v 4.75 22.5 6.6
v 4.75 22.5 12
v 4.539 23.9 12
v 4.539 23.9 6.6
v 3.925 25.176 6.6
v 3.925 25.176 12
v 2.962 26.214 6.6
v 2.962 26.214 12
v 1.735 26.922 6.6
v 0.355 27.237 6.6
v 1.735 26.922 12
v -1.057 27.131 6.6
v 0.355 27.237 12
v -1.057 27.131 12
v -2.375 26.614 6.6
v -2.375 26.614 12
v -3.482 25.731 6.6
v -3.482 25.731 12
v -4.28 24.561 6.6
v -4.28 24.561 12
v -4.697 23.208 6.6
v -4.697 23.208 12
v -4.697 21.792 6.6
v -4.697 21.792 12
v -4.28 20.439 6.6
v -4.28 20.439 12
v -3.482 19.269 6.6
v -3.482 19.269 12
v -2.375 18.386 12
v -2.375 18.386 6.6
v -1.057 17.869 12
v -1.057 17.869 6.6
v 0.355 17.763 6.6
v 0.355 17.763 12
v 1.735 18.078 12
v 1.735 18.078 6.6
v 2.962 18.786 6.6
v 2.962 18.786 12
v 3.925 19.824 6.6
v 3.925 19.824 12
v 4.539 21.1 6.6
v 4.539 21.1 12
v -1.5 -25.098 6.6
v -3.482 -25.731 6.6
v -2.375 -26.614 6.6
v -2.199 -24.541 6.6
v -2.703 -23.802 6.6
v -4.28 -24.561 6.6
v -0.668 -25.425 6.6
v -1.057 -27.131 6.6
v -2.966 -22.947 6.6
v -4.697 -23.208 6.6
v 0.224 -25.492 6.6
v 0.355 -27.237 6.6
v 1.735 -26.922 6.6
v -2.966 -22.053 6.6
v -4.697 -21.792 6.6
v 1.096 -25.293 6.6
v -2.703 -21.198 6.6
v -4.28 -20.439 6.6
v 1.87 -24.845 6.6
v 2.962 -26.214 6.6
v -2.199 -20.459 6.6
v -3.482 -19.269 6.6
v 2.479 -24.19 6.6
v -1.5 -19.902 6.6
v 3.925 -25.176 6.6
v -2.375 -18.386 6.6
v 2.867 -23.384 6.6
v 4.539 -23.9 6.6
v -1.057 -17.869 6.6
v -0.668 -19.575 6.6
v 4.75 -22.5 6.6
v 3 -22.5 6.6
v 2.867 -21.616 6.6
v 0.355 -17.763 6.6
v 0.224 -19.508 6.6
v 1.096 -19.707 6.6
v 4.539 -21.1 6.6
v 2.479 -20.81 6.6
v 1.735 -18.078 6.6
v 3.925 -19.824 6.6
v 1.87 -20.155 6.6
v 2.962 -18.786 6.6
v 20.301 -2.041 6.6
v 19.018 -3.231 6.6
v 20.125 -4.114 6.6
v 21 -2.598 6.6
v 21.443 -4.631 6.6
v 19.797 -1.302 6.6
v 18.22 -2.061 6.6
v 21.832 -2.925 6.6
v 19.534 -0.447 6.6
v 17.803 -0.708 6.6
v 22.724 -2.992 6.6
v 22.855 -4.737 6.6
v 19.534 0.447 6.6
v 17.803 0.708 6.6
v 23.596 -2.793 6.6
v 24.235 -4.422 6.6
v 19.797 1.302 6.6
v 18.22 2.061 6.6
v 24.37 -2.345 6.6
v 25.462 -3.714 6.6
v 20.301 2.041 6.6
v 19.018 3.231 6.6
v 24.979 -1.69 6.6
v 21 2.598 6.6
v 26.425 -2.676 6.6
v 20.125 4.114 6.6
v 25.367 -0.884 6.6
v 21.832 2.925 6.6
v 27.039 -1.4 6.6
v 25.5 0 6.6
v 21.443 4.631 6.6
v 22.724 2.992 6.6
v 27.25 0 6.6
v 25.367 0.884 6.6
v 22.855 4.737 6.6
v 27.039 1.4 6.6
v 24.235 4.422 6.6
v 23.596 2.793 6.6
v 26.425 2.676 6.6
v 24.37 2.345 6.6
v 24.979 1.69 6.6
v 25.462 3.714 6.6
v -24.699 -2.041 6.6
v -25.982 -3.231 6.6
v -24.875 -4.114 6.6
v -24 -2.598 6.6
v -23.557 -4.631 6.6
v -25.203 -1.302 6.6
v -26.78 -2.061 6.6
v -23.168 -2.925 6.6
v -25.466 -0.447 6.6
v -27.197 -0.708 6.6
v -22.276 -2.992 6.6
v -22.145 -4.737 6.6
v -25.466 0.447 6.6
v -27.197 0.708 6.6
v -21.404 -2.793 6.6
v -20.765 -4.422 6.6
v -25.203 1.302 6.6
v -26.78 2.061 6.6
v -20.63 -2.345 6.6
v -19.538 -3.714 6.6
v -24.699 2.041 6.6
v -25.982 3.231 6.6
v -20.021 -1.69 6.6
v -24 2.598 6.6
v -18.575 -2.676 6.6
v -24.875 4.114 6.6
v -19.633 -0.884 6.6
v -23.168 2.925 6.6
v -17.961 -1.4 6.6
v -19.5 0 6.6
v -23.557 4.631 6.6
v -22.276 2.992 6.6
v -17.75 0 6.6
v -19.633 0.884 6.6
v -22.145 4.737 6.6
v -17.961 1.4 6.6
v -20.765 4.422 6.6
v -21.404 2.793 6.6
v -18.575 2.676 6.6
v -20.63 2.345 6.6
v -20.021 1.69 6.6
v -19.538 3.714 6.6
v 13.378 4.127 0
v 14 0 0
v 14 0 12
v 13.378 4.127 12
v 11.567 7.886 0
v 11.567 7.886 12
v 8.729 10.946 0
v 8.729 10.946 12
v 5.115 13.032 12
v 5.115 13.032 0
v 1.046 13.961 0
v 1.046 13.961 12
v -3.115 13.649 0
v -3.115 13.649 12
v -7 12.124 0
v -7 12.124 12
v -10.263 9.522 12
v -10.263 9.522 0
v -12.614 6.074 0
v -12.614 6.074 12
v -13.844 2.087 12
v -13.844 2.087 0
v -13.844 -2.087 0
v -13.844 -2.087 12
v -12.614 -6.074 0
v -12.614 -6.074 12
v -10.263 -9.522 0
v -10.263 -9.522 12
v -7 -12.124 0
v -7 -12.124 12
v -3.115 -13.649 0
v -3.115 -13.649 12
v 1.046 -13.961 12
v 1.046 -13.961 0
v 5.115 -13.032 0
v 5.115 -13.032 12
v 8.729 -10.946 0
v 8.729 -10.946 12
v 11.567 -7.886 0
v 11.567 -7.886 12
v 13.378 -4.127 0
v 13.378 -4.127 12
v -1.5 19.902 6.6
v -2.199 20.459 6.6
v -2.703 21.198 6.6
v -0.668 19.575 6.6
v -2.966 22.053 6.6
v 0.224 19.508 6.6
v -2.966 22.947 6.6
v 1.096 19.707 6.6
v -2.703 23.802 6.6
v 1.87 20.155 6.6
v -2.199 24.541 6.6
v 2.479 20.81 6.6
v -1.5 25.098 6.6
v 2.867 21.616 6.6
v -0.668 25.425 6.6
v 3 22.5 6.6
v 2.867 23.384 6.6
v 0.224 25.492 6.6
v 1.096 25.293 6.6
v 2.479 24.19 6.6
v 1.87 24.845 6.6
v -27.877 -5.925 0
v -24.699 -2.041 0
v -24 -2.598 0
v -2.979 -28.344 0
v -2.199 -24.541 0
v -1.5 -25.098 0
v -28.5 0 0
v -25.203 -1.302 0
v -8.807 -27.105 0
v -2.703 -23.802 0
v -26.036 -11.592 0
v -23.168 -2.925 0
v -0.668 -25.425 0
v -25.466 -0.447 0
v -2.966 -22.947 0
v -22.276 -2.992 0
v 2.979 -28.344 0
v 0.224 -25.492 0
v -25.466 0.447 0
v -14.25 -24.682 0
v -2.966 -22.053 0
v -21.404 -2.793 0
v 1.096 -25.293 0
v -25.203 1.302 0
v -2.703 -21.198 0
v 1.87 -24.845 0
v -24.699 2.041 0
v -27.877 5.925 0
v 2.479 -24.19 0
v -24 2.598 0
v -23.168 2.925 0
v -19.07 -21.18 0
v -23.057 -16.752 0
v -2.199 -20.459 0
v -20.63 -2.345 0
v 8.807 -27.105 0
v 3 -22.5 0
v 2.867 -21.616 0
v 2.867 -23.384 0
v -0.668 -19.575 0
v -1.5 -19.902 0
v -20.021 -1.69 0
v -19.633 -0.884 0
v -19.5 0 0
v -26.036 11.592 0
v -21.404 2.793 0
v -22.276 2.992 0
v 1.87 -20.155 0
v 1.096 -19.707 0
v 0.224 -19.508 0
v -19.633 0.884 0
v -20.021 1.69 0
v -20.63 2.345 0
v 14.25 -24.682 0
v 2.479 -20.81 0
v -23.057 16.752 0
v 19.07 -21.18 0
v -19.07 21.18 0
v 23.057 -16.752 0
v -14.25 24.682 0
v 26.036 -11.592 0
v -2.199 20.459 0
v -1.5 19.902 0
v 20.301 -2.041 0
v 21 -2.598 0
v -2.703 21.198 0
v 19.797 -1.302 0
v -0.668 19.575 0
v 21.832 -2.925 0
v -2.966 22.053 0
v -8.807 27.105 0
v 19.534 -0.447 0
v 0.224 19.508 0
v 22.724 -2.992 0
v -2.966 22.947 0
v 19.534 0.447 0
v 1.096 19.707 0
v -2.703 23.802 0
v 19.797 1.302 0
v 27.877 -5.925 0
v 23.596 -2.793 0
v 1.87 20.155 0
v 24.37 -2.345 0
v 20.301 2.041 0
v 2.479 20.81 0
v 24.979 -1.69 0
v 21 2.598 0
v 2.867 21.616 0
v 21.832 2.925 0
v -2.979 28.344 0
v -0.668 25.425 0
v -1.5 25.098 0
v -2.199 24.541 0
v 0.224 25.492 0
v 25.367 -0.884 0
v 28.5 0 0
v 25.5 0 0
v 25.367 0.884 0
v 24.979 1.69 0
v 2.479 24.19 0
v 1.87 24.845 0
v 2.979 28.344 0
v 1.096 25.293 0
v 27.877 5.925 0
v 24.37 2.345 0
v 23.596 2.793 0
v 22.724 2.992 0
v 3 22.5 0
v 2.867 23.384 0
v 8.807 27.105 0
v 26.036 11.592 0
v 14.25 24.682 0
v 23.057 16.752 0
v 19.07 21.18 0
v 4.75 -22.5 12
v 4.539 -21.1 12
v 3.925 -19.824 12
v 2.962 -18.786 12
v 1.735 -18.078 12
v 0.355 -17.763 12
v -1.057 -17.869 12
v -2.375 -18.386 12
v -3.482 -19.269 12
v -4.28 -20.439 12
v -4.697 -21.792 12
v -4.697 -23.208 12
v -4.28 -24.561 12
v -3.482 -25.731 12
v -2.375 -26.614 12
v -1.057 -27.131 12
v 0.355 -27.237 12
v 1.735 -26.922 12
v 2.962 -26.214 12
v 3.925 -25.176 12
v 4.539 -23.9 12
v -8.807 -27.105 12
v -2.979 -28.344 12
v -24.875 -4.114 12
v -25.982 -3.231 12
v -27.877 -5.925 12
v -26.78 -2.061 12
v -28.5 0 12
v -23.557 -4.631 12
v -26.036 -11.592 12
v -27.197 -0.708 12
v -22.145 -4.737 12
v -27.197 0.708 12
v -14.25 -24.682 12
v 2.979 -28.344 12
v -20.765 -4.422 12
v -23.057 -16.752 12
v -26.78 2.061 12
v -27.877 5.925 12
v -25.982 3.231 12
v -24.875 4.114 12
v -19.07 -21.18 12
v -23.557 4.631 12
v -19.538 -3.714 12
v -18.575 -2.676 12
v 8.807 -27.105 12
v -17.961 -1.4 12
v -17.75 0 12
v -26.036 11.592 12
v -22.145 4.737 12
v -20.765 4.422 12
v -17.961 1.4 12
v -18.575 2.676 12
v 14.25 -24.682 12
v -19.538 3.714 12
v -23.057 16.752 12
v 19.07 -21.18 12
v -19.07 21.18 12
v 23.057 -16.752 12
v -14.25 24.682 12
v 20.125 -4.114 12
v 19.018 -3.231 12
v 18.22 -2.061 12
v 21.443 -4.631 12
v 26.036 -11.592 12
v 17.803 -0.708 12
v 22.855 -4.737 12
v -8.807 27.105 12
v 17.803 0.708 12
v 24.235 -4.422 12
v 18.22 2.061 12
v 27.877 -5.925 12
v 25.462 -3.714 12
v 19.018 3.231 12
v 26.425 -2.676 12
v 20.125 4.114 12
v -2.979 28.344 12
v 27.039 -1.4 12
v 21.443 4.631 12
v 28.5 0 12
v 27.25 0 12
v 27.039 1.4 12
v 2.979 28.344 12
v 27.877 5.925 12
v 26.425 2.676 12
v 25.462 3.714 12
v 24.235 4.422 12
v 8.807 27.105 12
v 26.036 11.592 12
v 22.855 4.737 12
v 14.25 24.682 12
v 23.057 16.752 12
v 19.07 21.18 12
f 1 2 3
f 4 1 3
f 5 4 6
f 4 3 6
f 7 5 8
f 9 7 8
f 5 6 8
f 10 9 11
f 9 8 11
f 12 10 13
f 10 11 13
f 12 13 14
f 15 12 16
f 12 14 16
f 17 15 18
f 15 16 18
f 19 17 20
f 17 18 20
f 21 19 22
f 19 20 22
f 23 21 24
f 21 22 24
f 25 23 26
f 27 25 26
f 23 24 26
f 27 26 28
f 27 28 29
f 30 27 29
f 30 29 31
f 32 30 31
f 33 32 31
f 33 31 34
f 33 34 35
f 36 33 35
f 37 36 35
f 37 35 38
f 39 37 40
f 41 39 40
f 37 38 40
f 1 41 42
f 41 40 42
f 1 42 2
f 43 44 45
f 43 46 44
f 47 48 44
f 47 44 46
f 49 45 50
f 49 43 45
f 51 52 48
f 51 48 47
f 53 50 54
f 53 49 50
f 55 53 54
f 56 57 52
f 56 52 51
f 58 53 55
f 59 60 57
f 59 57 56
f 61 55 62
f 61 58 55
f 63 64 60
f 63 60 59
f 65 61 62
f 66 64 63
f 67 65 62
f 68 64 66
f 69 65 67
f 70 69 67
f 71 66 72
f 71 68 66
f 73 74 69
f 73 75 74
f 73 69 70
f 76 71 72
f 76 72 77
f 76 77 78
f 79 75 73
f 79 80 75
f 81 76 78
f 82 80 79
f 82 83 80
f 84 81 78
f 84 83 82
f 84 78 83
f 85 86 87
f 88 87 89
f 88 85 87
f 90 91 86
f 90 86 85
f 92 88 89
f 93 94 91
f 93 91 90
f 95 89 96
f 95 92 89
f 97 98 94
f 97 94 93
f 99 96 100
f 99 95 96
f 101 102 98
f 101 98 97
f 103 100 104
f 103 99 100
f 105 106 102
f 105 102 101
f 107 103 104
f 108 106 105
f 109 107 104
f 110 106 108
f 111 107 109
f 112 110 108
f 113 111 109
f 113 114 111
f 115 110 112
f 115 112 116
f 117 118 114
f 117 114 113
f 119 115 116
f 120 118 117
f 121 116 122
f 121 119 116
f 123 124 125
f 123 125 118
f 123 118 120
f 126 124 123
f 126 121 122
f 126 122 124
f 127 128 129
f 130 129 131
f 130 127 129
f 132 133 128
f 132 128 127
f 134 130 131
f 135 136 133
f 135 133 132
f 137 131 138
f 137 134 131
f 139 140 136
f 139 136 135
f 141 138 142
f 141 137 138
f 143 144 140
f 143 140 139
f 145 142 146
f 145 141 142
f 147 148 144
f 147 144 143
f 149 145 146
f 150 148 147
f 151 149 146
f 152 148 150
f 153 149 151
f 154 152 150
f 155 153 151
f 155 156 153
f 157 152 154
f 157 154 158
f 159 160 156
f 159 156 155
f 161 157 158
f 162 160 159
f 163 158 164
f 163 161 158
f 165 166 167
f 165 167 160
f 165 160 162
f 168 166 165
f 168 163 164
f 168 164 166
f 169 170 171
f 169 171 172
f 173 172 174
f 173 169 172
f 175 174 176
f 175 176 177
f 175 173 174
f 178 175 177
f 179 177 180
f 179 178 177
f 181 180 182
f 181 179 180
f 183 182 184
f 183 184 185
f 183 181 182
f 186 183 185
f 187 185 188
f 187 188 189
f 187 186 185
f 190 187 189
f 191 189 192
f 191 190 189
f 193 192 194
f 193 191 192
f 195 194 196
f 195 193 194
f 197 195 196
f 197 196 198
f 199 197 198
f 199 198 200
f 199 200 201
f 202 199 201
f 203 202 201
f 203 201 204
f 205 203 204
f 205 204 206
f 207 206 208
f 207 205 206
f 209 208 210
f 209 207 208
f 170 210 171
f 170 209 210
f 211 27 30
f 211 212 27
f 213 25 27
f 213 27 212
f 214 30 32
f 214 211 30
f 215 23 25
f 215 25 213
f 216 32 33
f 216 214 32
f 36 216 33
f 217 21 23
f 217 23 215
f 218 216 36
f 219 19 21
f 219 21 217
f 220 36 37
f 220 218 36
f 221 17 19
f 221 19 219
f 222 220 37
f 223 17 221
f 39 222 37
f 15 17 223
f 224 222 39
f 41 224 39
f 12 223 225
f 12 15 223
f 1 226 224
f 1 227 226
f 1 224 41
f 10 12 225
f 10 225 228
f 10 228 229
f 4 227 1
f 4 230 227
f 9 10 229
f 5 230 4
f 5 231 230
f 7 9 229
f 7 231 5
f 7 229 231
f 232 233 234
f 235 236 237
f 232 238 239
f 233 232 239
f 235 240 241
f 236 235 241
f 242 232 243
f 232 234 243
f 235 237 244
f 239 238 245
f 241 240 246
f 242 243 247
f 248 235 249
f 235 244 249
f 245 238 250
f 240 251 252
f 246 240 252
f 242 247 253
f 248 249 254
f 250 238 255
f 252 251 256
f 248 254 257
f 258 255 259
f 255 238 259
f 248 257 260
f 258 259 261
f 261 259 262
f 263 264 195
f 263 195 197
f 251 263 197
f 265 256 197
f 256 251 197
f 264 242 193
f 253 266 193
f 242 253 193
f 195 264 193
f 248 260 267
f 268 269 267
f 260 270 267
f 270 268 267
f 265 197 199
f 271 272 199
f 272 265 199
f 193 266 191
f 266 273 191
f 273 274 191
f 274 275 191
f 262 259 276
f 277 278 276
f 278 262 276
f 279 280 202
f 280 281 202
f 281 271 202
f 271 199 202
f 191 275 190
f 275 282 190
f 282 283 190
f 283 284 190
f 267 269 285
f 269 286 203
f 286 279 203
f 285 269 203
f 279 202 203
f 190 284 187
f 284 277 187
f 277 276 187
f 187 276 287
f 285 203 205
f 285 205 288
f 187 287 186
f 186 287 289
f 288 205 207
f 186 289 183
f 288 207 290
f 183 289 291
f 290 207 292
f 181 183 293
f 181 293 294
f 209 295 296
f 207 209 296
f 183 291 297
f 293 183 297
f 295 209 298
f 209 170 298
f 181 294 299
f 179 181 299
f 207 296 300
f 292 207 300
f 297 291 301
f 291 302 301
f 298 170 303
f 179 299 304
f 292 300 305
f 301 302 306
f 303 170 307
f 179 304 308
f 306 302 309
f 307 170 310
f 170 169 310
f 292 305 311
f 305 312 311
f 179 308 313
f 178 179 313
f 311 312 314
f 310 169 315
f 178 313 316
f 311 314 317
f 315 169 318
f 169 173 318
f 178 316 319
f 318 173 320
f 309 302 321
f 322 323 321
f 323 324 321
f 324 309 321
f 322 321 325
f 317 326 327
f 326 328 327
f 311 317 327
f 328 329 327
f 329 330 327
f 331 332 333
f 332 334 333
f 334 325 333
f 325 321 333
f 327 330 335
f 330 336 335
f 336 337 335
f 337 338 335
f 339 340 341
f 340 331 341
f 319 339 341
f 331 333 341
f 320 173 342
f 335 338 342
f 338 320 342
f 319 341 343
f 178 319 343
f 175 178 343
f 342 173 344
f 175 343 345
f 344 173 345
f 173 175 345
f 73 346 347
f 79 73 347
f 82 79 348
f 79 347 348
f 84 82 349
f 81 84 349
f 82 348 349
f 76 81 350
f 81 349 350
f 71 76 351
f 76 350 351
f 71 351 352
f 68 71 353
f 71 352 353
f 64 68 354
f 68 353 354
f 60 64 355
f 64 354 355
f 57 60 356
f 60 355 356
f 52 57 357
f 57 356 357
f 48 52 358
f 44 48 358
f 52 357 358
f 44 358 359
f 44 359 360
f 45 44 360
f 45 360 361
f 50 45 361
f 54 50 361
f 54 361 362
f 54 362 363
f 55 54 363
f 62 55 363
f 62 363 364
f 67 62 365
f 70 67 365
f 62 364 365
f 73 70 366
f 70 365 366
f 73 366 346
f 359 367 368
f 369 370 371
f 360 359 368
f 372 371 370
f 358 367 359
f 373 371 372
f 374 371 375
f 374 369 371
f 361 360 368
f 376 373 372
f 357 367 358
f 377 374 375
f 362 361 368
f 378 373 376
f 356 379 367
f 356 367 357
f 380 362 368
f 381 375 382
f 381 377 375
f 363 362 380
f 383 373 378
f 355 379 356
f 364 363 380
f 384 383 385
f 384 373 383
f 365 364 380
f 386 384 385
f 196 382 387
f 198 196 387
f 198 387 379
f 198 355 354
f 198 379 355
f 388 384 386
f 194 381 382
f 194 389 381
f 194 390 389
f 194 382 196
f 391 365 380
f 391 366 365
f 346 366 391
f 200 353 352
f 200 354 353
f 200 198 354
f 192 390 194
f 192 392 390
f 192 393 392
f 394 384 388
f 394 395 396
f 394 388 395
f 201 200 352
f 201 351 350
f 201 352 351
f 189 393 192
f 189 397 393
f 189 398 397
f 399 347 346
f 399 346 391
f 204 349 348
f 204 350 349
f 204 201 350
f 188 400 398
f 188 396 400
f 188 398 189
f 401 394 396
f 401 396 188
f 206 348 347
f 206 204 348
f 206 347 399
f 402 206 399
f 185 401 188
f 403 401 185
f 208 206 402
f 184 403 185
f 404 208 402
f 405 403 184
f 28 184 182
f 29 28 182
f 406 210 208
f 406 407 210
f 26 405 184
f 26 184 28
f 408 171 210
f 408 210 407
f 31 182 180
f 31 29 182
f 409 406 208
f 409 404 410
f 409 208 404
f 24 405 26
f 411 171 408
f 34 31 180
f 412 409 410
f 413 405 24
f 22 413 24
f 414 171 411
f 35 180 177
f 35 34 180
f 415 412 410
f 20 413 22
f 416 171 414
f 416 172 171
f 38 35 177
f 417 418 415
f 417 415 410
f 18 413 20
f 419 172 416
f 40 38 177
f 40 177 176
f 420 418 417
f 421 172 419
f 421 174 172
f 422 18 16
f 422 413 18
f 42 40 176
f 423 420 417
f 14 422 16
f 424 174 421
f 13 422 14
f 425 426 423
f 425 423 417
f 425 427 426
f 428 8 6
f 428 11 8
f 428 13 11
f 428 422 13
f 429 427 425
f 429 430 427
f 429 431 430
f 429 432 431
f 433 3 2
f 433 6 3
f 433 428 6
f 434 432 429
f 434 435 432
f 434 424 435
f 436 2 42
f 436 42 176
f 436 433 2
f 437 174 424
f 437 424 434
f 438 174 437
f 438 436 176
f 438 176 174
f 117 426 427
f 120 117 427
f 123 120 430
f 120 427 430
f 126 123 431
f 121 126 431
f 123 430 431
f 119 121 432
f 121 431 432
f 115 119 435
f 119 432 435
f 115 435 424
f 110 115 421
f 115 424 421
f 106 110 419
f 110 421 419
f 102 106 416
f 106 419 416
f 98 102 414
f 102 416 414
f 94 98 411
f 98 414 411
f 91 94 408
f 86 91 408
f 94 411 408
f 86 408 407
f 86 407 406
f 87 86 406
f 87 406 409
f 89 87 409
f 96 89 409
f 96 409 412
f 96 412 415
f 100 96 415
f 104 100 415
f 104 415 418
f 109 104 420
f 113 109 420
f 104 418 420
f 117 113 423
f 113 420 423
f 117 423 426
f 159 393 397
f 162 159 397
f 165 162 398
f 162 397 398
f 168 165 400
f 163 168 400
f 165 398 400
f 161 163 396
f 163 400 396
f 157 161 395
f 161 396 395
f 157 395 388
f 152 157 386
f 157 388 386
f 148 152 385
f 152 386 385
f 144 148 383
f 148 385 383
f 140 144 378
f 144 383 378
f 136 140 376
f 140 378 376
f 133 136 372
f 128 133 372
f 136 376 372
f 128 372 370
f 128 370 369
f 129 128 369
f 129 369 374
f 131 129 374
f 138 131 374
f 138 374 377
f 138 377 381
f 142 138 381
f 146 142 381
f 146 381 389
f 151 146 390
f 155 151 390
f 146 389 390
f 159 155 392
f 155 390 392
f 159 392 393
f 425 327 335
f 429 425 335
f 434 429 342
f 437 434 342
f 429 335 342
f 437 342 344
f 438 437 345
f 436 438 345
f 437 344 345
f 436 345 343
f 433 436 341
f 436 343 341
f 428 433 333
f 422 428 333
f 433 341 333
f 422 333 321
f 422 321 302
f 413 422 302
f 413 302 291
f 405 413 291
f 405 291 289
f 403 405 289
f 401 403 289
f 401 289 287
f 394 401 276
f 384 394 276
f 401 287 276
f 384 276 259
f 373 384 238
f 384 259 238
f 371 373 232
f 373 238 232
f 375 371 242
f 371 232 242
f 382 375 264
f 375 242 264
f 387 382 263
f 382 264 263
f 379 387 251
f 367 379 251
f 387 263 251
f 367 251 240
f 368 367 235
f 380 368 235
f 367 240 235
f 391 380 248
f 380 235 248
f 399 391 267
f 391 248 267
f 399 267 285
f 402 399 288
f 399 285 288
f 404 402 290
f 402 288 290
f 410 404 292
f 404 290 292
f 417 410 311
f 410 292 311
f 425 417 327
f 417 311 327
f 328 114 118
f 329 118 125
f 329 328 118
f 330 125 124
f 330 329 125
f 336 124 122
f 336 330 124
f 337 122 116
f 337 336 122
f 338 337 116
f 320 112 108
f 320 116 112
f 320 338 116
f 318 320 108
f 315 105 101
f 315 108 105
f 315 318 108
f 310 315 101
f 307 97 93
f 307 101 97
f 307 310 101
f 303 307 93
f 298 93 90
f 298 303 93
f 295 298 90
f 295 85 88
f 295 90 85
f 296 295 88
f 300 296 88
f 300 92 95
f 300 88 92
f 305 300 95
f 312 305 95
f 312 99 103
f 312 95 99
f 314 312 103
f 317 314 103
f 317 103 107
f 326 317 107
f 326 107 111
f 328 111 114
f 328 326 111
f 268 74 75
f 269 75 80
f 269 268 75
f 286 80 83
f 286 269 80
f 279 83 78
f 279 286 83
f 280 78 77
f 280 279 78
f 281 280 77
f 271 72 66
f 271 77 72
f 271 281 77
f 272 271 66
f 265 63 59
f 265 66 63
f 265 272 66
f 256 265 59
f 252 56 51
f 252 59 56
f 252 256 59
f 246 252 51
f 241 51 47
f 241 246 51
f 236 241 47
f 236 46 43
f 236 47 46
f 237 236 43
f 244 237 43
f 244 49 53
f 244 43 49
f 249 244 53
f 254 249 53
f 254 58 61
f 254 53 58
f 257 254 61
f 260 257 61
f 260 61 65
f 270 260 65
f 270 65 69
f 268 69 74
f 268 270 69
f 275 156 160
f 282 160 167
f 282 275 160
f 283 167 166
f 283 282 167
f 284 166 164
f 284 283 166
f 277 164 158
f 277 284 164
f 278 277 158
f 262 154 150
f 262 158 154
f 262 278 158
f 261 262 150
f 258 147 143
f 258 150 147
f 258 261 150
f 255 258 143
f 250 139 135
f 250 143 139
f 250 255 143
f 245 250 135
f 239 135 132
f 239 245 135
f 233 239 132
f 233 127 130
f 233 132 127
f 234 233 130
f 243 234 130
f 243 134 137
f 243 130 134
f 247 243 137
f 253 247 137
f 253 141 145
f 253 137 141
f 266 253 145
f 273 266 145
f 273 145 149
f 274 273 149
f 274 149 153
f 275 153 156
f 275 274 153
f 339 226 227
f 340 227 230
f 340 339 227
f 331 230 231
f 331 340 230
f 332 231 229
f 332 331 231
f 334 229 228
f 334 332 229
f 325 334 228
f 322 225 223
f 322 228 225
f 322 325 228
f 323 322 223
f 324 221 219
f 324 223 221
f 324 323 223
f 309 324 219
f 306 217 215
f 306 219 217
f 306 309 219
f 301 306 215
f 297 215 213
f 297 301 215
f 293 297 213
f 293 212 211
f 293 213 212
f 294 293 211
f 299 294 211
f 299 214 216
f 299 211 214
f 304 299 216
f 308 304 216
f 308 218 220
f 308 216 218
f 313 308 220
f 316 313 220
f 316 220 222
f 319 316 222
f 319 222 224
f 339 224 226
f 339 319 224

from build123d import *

# Parameters (mm, degrees)
SKETCH_1_R          = 28.5
SKETCH_1_R_2        = 14
SKETCH_1_R_3        = 3
EXTRUDE_1_DEPTH     = 12
SKETCH_2_R          = 4.75
CUT_EXTRUDE_1_DEPTH = 5.4


with BuildPart() as part:
    # 草图1 → 凸台-拉伸1 (new body)
    with BuildSketch(Plane.XY):
        Circle(SKETCH_1_R)
        Circle(SKETCH_1_R_2, mode=Mode.SUBTRACT)
        with Locations((0, 22.5)):
            Circle(SKETCH_1_R_3, mode=Mode.SUBTRACT)
        with Locations((22.5, 0)):
            Circle(SKETCH_1_R_3, mode=Mode.SUBTRACT)
        with Locations((0, -22.5)):
            Circle(SKETCH_1_R_3, mode=Mode.SUBTRACT)
        with Locations((-22.5, 0)):
            Circle(SKETCH_1_R_3, mode=Mode.SUBTRACT)
    extrude(amount=EXTRUDE_1_DEPTH)

    # 草图2 → 切除-拉伸1 (cut)
    with BuildSketch(Plane.XY.offset(12)):
        with Locations((0, 22.5)):
            Circle(SKETCH_2_R)
        with Locations((22.5, 0)):
            Circle(SKETCH_2_R)
        with Locations((0, -22.5)):
            Circle(SKETCH_2_R)
        with Locations((-22.5, 0)):
            Circle(SKETCH_2_R)
    extrude(amount=-CUT_EXTRUDE_1_DEPTH, mode=Mode.SUBTRACT)


solid = part.part
